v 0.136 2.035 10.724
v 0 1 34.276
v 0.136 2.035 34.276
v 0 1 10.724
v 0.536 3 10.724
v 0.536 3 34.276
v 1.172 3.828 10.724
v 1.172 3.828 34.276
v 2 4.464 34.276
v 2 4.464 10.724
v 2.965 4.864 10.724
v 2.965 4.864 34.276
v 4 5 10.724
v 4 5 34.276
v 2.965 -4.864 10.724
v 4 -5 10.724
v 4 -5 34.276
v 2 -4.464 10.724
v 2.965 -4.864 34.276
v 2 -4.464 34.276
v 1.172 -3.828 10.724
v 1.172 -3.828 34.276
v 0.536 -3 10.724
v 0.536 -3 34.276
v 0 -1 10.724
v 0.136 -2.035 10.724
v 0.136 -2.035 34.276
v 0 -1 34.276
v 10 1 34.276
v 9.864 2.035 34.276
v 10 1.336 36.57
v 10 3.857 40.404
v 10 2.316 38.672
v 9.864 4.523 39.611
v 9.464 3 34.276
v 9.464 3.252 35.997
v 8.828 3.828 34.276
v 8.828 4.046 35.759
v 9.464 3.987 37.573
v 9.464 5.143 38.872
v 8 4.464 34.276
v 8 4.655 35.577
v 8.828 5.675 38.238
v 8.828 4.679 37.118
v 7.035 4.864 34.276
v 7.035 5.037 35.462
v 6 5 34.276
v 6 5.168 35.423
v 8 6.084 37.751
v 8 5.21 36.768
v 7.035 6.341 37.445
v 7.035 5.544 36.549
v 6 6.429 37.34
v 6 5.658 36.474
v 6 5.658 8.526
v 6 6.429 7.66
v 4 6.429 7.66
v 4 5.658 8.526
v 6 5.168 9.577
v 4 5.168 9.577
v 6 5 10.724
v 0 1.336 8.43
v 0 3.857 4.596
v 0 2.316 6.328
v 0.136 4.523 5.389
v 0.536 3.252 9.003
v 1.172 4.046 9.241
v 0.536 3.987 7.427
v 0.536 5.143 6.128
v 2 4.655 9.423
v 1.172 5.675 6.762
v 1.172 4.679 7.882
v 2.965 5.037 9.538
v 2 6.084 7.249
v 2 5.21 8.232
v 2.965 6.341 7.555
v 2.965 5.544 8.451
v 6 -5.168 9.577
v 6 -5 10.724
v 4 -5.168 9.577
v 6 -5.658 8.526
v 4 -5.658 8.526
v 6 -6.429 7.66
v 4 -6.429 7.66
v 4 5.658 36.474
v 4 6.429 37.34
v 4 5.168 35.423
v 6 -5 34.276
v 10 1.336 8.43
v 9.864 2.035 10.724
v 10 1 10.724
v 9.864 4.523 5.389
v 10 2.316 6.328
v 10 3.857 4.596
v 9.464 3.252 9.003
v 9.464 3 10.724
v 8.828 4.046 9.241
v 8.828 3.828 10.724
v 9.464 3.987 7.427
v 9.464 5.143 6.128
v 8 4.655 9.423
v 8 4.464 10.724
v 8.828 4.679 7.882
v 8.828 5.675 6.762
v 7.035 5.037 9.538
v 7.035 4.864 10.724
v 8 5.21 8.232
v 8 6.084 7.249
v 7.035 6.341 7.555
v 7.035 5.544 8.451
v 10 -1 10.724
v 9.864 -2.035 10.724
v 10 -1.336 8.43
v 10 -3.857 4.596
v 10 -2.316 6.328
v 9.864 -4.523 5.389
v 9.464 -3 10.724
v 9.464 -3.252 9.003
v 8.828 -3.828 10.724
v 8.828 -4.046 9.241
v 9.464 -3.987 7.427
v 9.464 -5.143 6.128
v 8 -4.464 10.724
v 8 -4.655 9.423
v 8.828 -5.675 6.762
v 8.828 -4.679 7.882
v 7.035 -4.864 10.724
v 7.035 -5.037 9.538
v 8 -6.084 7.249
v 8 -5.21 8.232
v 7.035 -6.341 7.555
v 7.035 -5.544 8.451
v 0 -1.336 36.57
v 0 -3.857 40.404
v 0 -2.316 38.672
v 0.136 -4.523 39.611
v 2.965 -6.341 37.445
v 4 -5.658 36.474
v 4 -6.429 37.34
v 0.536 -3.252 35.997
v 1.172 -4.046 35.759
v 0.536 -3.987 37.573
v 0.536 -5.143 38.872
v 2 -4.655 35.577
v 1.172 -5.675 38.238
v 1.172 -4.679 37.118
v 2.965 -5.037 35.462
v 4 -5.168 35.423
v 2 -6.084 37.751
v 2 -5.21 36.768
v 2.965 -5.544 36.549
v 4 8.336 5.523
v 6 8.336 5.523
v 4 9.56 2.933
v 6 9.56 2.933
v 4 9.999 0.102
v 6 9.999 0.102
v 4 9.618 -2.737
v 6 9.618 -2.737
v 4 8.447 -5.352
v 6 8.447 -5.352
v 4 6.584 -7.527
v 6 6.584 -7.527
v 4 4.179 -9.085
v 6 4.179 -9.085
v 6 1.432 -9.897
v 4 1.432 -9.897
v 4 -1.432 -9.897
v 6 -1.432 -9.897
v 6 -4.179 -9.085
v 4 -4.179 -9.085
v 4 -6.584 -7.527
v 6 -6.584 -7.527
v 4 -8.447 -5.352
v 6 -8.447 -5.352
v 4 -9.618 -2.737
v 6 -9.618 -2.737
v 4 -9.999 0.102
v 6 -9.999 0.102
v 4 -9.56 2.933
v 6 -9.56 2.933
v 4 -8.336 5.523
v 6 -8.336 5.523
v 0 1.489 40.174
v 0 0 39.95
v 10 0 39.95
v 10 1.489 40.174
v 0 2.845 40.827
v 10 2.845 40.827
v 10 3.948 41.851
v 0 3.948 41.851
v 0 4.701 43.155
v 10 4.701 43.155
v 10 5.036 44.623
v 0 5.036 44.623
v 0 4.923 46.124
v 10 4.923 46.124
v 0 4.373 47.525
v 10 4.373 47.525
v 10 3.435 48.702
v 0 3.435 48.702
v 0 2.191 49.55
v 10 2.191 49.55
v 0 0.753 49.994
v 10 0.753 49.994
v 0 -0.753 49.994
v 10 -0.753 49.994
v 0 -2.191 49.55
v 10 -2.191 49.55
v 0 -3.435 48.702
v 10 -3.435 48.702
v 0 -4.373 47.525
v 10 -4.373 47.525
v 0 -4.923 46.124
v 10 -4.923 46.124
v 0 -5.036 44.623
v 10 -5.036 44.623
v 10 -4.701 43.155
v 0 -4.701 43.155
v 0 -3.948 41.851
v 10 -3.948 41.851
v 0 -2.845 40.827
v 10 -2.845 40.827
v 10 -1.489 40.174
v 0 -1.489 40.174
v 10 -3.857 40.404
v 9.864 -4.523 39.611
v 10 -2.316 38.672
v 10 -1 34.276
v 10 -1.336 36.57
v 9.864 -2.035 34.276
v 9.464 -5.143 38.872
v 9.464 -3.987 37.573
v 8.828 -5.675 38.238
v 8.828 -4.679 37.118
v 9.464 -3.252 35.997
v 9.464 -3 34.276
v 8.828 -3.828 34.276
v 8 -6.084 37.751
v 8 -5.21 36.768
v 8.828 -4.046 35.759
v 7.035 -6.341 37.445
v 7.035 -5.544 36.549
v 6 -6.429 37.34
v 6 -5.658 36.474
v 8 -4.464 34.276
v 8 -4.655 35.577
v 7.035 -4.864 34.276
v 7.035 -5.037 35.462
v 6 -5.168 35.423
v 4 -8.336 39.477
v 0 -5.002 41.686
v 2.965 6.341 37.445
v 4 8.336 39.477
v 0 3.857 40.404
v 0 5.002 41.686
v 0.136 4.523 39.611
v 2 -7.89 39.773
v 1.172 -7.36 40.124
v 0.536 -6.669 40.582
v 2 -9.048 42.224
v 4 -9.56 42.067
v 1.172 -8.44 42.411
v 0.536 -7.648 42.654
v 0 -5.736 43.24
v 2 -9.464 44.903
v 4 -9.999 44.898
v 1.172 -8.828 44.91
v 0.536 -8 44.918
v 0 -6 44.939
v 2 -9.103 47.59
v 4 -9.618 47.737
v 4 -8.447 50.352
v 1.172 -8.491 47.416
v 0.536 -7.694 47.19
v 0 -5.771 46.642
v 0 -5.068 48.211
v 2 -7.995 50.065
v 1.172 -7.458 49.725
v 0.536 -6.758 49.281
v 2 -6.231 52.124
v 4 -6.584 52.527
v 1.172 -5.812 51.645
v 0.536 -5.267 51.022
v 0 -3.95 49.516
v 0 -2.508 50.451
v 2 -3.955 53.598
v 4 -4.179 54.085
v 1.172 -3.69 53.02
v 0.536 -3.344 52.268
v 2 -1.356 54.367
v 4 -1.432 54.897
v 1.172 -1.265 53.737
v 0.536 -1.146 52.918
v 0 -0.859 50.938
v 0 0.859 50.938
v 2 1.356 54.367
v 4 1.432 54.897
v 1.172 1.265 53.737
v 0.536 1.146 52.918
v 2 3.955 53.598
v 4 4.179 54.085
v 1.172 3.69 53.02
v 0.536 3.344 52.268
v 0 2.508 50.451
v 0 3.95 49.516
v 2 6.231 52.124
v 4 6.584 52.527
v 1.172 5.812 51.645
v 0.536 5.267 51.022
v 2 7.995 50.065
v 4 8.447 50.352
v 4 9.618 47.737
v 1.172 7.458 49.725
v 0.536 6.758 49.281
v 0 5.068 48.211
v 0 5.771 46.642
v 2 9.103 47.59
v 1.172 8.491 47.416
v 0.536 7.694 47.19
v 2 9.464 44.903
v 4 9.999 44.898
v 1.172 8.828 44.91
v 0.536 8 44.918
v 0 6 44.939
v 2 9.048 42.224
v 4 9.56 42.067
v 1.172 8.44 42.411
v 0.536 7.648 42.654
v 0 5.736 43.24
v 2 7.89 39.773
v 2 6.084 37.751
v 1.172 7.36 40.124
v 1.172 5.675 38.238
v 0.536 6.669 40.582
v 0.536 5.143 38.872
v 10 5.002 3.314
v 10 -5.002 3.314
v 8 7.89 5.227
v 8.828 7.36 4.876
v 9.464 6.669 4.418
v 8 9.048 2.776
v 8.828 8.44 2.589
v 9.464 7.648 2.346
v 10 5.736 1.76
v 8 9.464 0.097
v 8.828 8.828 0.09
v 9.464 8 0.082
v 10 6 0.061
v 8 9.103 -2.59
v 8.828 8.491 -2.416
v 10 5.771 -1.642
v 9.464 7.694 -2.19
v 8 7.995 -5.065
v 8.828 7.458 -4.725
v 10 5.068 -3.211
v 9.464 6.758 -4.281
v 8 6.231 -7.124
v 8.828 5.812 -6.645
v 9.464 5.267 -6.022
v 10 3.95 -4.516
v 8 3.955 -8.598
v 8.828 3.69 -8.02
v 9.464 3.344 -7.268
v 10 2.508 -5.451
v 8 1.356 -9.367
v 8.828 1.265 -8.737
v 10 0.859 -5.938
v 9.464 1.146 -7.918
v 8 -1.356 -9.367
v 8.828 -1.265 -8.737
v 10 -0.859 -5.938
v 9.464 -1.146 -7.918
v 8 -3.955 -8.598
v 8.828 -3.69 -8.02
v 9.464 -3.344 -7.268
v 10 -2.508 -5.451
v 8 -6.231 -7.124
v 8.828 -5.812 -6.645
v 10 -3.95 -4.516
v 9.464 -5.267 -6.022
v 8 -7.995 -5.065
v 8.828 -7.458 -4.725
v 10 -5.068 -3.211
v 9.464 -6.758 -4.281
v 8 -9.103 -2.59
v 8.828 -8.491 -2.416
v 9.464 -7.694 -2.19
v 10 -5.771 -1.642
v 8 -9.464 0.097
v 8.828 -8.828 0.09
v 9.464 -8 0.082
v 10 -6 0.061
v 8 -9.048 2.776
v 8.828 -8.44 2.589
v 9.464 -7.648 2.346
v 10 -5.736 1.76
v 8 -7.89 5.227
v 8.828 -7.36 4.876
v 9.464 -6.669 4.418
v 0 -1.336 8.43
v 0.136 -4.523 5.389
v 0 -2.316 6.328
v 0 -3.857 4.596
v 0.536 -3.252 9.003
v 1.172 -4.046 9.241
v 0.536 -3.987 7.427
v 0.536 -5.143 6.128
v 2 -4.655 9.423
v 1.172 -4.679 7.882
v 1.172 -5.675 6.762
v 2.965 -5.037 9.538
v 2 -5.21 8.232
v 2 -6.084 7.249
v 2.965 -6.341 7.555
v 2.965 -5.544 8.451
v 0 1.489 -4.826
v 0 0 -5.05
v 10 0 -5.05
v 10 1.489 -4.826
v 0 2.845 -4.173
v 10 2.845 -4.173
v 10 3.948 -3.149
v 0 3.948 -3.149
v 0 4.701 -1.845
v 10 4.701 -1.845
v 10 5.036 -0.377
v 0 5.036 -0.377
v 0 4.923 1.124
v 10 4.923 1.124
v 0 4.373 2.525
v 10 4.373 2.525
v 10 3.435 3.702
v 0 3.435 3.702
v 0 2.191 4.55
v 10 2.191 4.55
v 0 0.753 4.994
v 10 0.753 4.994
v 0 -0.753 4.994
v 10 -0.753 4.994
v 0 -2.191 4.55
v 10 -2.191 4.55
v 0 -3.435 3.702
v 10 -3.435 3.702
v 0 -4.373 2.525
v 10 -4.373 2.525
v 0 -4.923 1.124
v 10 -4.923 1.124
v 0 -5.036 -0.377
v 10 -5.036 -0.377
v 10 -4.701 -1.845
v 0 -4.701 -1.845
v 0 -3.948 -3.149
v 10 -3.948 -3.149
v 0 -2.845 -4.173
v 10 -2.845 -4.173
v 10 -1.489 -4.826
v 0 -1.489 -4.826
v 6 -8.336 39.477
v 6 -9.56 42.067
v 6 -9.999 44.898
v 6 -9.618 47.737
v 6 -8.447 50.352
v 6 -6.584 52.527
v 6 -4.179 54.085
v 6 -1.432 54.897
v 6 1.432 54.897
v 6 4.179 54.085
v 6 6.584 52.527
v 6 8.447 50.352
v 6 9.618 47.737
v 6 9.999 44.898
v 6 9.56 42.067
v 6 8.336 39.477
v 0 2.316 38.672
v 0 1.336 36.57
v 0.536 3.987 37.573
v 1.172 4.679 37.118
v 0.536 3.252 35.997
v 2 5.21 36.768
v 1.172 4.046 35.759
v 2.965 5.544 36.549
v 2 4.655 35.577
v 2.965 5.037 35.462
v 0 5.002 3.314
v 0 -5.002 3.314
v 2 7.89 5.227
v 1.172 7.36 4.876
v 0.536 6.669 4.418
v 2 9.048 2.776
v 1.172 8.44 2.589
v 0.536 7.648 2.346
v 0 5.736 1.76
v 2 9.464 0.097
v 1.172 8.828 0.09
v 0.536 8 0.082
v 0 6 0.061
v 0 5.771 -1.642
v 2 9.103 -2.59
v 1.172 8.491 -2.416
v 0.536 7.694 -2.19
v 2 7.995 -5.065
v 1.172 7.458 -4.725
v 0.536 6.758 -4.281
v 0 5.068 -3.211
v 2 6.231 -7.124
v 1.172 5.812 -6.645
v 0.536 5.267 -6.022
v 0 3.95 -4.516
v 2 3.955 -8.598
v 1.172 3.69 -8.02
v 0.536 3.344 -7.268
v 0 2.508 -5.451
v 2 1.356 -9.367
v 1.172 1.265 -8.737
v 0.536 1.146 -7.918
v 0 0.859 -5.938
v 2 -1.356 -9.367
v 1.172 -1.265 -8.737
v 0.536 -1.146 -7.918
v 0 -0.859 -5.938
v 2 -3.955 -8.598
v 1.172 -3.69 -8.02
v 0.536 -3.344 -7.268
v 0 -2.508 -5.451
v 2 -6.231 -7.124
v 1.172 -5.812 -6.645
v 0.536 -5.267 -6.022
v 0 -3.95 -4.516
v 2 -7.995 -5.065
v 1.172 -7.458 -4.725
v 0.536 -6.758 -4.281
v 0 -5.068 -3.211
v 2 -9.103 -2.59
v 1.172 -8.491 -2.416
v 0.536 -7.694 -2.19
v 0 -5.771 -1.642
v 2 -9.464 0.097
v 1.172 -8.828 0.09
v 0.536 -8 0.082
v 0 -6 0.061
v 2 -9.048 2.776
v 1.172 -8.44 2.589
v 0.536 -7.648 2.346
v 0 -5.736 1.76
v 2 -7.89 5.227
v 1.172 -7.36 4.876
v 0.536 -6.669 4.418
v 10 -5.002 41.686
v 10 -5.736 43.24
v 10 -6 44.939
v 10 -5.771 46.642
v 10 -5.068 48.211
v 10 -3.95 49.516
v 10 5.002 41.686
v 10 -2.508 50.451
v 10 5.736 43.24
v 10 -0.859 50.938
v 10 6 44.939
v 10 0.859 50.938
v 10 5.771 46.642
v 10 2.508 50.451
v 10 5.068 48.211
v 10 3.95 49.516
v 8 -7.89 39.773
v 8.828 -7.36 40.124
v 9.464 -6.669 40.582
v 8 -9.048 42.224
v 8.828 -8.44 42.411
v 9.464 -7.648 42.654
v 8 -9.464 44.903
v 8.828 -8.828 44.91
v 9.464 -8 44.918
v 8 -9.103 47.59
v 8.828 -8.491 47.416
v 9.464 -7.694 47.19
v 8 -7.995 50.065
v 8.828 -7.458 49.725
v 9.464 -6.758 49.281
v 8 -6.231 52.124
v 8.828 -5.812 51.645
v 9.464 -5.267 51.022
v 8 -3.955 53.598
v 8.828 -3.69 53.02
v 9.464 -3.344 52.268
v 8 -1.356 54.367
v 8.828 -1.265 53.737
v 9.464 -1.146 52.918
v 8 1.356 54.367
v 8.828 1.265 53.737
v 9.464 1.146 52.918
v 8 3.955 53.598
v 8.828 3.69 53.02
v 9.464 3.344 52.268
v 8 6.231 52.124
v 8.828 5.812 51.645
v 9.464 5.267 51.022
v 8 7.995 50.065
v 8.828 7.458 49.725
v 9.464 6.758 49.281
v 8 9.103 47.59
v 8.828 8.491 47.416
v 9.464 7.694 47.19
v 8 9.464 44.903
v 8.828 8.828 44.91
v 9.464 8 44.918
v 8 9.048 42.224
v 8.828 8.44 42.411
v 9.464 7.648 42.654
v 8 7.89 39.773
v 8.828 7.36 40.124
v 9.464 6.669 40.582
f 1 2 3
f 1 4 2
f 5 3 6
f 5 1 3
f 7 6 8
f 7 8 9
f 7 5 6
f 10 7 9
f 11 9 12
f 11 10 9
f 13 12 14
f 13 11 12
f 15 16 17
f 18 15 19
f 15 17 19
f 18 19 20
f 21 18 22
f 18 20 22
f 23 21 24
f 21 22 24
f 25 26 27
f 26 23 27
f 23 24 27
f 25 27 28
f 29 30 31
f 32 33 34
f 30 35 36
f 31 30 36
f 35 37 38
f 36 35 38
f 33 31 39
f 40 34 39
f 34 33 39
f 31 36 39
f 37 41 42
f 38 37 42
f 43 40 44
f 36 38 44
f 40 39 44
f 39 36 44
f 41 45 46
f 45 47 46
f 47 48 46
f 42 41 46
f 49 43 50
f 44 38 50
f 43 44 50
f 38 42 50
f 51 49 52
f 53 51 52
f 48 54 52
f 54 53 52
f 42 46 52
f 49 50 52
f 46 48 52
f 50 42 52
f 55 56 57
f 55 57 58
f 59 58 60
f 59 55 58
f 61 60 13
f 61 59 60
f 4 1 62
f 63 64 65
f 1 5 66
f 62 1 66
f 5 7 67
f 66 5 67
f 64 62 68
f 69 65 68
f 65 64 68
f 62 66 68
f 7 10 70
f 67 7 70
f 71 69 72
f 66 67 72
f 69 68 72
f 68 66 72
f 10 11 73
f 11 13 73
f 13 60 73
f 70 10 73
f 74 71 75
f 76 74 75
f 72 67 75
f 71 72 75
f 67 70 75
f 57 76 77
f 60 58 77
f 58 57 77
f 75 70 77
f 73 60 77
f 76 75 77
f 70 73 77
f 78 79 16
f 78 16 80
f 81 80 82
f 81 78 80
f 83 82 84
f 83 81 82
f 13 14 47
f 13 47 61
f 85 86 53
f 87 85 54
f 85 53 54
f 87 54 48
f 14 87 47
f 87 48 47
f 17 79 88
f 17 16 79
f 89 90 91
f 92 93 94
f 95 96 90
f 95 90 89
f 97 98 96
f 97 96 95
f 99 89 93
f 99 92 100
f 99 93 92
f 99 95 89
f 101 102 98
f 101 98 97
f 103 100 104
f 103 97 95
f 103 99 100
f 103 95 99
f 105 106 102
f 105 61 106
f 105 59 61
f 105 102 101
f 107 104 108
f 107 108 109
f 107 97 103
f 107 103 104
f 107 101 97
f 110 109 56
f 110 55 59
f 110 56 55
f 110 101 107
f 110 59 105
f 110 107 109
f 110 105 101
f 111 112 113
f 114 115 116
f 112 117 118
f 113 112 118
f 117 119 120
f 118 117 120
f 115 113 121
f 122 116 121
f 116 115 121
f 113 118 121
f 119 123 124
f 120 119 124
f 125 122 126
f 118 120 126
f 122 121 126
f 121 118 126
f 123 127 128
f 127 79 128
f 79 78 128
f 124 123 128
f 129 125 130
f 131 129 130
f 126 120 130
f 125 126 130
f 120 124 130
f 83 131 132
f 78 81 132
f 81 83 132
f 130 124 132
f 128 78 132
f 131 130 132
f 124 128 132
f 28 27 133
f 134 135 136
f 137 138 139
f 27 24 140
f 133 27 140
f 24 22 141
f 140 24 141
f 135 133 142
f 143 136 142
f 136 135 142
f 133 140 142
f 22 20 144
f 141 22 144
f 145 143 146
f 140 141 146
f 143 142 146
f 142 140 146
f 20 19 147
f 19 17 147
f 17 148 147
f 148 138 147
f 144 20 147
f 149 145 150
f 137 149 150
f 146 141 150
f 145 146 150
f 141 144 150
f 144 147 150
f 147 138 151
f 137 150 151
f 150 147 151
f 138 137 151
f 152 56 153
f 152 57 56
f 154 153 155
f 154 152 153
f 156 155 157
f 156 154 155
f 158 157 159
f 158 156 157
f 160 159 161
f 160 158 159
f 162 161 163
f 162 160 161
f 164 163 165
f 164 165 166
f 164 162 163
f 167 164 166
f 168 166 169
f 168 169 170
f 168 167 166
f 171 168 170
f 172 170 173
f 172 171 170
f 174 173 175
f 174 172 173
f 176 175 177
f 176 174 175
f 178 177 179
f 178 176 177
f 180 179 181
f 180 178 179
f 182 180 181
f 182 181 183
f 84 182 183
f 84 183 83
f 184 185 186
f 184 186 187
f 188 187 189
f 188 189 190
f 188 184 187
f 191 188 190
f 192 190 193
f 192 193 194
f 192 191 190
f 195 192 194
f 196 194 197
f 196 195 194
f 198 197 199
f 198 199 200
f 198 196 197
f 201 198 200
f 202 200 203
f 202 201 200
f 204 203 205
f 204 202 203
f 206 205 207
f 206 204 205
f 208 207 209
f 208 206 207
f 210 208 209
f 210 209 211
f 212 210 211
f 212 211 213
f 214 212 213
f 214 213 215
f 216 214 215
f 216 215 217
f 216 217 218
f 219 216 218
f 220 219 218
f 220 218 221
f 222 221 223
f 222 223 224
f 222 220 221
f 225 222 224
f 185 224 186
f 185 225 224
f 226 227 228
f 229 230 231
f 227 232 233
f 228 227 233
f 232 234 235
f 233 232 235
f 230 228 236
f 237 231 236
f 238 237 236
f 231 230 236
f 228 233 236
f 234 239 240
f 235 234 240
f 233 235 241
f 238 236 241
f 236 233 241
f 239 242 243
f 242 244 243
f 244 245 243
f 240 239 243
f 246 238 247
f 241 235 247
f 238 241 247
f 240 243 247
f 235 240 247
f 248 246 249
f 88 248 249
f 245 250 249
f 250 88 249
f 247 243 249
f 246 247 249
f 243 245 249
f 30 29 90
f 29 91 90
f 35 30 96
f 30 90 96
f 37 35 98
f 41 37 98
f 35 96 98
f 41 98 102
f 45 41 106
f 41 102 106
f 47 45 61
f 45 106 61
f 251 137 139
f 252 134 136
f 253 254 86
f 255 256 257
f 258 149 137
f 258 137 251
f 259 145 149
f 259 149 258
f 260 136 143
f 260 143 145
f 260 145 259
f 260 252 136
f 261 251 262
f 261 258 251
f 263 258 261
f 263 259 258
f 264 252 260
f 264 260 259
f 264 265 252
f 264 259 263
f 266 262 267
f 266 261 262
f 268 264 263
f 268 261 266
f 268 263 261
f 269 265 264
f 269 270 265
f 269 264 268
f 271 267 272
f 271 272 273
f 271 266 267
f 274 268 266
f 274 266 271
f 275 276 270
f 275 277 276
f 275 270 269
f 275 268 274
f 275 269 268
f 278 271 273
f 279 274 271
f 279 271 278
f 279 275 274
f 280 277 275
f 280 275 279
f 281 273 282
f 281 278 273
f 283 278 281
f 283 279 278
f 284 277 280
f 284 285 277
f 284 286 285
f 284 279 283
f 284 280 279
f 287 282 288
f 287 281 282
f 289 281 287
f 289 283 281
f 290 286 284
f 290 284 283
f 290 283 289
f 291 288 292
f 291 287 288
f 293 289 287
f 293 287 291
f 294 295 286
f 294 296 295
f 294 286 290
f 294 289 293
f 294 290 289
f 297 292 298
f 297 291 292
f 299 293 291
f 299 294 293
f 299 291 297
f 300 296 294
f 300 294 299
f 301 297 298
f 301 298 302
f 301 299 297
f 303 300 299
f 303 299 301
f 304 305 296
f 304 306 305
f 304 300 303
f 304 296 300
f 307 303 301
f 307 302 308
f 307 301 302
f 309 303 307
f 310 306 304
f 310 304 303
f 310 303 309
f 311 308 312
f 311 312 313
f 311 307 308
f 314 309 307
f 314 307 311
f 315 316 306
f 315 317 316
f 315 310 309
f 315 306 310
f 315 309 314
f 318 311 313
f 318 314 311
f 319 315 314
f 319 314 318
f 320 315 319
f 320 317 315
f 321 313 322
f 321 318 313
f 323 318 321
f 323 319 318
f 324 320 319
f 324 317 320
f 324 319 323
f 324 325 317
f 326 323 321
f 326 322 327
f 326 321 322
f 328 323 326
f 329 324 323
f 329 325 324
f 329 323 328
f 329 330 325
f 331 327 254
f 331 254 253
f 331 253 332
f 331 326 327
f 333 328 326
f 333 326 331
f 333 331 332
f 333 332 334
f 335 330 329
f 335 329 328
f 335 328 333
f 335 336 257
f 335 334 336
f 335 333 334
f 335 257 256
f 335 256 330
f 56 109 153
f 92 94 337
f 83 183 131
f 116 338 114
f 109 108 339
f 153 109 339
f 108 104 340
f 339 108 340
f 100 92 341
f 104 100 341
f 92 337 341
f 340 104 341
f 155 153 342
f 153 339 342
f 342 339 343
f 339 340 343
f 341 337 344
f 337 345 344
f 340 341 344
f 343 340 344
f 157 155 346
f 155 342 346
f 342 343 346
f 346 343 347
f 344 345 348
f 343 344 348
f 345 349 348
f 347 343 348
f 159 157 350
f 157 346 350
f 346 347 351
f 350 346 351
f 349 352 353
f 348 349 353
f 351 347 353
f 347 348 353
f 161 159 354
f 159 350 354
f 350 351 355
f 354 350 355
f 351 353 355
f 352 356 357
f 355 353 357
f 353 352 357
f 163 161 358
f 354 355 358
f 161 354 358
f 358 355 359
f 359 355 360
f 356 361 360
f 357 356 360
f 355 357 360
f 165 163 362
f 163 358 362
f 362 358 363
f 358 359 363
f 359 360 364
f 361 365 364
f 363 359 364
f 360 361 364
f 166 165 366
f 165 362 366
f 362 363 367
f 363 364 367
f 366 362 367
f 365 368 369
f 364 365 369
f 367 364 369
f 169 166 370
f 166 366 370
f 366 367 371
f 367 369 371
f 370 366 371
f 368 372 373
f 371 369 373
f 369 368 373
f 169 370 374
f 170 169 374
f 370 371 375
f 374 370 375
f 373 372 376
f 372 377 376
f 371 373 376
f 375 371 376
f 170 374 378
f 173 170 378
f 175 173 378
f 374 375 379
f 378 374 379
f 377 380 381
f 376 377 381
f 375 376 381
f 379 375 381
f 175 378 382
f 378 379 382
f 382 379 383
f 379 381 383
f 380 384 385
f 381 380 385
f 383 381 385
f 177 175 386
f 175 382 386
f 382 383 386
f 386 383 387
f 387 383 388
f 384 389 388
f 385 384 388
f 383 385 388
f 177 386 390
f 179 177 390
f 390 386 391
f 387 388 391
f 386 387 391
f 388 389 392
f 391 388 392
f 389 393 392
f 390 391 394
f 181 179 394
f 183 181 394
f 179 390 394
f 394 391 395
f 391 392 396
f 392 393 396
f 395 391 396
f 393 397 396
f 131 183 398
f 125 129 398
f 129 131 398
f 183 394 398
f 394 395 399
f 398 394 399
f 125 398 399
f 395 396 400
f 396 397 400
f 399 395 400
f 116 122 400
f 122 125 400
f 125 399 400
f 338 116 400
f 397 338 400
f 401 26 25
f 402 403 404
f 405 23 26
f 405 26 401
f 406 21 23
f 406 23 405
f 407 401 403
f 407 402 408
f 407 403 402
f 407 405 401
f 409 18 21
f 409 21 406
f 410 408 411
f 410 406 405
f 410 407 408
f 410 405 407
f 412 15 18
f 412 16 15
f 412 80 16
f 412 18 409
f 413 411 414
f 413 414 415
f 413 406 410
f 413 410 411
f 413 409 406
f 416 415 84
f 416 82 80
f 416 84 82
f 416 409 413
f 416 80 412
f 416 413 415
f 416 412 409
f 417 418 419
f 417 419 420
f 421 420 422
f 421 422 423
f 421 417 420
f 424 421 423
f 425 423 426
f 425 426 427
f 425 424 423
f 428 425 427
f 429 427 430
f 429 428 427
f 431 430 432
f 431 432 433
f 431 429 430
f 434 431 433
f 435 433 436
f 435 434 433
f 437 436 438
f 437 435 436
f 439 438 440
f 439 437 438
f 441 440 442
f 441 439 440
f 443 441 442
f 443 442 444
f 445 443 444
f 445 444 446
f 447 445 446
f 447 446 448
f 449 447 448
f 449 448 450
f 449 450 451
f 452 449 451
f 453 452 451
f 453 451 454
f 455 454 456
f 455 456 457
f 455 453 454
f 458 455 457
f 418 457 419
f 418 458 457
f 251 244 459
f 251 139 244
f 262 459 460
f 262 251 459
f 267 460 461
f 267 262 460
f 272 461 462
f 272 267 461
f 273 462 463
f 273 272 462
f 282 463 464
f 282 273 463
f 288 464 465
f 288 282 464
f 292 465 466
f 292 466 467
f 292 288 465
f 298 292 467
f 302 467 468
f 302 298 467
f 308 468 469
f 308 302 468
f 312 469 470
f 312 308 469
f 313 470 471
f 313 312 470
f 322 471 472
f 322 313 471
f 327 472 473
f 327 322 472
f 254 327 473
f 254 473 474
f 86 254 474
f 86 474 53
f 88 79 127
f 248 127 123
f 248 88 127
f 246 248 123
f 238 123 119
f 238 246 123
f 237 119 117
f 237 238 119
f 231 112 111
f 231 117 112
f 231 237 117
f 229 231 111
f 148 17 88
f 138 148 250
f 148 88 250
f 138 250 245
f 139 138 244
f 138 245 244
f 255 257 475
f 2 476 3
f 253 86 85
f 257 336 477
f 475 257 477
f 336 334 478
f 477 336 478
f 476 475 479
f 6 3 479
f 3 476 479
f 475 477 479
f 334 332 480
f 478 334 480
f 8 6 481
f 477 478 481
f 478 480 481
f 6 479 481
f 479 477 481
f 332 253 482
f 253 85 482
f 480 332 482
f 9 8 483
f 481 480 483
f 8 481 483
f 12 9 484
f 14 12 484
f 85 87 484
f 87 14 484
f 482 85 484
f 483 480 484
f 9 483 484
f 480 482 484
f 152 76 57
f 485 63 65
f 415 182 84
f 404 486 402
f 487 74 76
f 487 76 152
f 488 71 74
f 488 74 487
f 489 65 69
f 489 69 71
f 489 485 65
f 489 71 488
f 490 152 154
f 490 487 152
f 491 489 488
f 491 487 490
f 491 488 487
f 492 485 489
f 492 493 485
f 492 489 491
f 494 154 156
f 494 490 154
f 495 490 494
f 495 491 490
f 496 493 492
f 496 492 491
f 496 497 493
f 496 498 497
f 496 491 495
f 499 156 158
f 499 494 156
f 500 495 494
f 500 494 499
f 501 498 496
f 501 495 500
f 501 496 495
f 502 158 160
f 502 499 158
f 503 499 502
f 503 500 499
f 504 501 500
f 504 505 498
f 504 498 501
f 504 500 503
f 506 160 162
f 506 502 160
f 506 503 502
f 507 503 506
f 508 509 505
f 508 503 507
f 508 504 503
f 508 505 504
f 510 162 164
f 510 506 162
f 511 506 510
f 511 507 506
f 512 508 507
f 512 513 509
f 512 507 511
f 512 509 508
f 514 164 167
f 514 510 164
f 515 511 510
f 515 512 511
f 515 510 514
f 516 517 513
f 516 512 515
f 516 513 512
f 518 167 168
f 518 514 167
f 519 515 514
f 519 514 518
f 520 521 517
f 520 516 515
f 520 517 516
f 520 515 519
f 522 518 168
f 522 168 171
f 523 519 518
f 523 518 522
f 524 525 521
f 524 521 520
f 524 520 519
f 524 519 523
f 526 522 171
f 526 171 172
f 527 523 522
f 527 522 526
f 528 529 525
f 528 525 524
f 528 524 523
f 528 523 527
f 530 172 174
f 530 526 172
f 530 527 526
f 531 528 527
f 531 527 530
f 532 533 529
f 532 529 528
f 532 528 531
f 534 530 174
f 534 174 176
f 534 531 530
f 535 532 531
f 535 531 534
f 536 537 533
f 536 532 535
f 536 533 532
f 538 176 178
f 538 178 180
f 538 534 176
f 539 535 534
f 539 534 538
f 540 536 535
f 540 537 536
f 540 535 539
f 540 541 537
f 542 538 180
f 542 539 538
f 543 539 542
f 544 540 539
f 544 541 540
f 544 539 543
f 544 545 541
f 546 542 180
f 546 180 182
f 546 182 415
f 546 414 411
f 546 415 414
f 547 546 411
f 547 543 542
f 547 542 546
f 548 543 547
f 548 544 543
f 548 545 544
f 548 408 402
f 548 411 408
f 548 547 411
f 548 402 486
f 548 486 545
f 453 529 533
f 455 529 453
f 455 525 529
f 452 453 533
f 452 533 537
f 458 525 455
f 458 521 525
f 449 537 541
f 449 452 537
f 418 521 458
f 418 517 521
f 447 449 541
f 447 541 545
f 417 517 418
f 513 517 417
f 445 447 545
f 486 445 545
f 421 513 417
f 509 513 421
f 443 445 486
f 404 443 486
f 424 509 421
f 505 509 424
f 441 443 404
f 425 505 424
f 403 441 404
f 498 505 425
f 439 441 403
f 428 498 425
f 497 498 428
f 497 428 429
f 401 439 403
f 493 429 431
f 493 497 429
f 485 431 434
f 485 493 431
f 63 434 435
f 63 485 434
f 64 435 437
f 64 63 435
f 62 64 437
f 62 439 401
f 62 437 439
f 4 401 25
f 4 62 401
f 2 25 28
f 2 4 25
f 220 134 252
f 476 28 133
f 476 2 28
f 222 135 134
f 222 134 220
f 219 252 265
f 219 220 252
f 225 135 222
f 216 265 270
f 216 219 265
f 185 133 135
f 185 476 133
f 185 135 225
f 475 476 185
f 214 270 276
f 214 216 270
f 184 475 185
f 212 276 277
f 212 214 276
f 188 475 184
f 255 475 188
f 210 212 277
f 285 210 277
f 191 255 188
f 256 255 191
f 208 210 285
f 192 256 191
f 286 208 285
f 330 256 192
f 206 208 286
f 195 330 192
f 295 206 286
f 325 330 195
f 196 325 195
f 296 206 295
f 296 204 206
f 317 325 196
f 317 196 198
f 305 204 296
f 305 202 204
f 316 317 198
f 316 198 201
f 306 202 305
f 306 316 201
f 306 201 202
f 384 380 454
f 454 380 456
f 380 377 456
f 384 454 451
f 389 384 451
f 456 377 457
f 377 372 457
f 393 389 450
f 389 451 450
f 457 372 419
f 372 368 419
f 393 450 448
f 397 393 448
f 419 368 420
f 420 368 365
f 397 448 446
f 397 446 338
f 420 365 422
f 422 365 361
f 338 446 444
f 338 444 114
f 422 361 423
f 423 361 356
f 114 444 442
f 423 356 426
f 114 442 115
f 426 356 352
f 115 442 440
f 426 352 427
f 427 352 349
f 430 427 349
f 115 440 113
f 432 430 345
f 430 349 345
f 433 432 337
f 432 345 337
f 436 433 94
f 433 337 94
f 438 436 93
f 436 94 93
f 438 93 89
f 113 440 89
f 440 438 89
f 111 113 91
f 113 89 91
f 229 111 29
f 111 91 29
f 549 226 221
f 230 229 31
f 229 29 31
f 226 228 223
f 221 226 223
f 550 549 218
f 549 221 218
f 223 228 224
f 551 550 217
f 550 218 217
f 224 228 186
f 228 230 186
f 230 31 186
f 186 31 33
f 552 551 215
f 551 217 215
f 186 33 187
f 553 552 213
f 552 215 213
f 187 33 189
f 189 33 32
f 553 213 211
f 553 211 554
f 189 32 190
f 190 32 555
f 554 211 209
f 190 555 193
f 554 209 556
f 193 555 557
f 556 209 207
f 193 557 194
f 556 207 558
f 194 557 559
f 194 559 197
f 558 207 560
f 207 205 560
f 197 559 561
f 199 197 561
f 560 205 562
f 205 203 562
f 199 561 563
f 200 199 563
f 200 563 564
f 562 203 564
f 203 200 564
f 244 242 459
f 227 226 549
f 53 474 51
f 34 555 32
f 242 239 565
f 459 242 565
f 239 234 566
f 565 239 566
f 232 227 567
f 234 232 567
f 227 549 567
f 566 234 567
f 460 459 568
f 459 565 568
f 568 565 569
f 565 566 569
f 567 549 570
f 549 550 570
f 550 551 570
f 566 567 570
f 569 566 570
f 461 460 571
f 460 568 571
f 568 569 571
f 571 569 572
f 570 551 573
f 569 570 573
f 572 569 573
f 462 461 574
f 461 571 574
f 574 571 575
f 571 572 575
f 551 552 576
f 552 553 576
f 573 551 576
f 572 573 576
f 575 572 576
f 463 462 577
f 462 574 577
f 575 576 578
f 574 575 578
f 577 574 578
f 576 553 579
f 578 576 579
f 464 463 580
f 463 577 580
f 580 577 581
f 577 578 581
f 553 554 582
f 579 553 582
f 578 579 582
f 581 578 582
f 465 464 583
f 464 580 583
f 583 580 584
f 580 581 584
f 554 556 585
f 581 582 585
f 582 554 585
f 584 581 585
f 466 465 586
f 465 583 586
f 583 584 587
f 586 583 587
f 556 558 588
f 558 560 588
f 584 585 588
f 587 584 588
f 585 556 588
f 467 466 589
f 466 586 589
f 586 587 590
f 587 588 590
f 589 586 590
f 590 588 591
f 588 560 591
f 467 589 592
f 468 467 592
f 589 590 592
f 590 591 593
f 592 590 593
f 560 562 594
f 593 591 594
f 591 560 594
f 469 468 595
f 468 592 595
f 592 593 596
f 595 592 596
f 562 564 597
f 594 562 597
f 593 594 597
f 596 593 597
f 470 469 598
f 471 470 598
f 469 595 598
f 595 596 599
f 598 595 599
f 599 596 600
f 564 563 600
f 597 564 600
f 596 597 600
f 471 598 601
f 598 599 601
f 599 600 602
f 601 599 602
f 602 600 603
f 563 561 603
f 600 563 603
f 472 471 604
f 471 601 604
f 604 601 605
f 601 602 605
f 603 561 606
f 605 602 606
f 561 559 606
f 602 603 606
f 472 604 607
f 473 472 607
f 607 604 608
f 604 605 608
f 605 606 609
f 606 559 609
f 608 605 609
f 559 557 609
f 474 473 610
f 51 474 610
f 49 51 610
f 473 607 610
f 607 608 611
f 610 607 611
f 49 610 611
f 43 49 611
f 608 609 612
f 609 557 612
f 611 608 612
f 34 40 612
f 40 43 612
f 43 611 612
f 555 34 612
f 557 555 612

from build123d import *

# Parameters (mm, degrees)
BOSS_EXTRUDE2_DEPTH = 20
SKETCH4_R           = 10.1
CUT_EXTRUDE1_DEPTH  = 20
SKETCH5_R           = 10.1
CUT_EXTRUDE2_DEPTH  = 20
FILLET1_R           = 8
SCALE1_SCALE        = 0.5


with BuildPart() as part:
    # Sketch3 → Boss-Extrude2 (new body)
    with BuildSketch(Plane(origin=(0, 0, 0), x_dir=(0, 0, -1), z_dir=(1, 0, 0))):
        with BuildLine():
            Line((-17.320508076, -10), (-72.679491924, -10))
            ThreePointArc((-72.679491924, -10), (-110, 0), (-72.679491924, 10))
            Line((-72.679491924, 10), (-17.320508076, 10))
            ThreePointArc((-17.320508076, 10), (20, 0), (-17.320508076, -10))
        make_face()
    extrude(amount=BOSS_EXTRUDE2_DEPTH)

    # Sketch4 → Cut-Extrude1 (cut)
    with BuildSketch(Plane(origin=(0, 0, 0), x_dir=(0, 0, -1), z_dir=(1, 0, 0))):
        with Locations((-90, 0)):
            Circle(SKETCH4_R)
    extrude(amount=CUT_EXTRUDE1_DEPTH, mode=Mode.SUBTRACT)

    # Sketch5 → Cut-Extrude2 (cut)
    with BuildSketch(Plane(origin=(0, 0, 0), x_dir=(0, 0, -1), z_dir=(1, 0, 0))):
        Circle(SKETCH5_R)
    extrude(amount=CUT_EXTRUDE2_DEPTH, mode=Mode.SUBTRACT)

    # Fillet1
    fillet1_edges = [part.edges().sort_by_distance(p)[0] for p in [
        (20, 0, 110),
        (20, -10, 45),
        (20, 0, -20),
        (0, -10, 45),
        (0, 0, 110),
        (0, 10, 45),
        (0, 0, -20),
        (10, -10, 17.320508076),
        (10, -10, 72.679491924),
        (10, 10, 72.679491924),
        (10, 10, 17.320508076),
        (20, 10, 45),
    ]]
    fillet(fillet1_edges, radius=FILLET1_R)


with BuildPart() as part_1:
    # Scale1: scaled about (0, 0, 0)
    add(part.part.scale(SCALE1_SCALE))


solid = part_1.part
